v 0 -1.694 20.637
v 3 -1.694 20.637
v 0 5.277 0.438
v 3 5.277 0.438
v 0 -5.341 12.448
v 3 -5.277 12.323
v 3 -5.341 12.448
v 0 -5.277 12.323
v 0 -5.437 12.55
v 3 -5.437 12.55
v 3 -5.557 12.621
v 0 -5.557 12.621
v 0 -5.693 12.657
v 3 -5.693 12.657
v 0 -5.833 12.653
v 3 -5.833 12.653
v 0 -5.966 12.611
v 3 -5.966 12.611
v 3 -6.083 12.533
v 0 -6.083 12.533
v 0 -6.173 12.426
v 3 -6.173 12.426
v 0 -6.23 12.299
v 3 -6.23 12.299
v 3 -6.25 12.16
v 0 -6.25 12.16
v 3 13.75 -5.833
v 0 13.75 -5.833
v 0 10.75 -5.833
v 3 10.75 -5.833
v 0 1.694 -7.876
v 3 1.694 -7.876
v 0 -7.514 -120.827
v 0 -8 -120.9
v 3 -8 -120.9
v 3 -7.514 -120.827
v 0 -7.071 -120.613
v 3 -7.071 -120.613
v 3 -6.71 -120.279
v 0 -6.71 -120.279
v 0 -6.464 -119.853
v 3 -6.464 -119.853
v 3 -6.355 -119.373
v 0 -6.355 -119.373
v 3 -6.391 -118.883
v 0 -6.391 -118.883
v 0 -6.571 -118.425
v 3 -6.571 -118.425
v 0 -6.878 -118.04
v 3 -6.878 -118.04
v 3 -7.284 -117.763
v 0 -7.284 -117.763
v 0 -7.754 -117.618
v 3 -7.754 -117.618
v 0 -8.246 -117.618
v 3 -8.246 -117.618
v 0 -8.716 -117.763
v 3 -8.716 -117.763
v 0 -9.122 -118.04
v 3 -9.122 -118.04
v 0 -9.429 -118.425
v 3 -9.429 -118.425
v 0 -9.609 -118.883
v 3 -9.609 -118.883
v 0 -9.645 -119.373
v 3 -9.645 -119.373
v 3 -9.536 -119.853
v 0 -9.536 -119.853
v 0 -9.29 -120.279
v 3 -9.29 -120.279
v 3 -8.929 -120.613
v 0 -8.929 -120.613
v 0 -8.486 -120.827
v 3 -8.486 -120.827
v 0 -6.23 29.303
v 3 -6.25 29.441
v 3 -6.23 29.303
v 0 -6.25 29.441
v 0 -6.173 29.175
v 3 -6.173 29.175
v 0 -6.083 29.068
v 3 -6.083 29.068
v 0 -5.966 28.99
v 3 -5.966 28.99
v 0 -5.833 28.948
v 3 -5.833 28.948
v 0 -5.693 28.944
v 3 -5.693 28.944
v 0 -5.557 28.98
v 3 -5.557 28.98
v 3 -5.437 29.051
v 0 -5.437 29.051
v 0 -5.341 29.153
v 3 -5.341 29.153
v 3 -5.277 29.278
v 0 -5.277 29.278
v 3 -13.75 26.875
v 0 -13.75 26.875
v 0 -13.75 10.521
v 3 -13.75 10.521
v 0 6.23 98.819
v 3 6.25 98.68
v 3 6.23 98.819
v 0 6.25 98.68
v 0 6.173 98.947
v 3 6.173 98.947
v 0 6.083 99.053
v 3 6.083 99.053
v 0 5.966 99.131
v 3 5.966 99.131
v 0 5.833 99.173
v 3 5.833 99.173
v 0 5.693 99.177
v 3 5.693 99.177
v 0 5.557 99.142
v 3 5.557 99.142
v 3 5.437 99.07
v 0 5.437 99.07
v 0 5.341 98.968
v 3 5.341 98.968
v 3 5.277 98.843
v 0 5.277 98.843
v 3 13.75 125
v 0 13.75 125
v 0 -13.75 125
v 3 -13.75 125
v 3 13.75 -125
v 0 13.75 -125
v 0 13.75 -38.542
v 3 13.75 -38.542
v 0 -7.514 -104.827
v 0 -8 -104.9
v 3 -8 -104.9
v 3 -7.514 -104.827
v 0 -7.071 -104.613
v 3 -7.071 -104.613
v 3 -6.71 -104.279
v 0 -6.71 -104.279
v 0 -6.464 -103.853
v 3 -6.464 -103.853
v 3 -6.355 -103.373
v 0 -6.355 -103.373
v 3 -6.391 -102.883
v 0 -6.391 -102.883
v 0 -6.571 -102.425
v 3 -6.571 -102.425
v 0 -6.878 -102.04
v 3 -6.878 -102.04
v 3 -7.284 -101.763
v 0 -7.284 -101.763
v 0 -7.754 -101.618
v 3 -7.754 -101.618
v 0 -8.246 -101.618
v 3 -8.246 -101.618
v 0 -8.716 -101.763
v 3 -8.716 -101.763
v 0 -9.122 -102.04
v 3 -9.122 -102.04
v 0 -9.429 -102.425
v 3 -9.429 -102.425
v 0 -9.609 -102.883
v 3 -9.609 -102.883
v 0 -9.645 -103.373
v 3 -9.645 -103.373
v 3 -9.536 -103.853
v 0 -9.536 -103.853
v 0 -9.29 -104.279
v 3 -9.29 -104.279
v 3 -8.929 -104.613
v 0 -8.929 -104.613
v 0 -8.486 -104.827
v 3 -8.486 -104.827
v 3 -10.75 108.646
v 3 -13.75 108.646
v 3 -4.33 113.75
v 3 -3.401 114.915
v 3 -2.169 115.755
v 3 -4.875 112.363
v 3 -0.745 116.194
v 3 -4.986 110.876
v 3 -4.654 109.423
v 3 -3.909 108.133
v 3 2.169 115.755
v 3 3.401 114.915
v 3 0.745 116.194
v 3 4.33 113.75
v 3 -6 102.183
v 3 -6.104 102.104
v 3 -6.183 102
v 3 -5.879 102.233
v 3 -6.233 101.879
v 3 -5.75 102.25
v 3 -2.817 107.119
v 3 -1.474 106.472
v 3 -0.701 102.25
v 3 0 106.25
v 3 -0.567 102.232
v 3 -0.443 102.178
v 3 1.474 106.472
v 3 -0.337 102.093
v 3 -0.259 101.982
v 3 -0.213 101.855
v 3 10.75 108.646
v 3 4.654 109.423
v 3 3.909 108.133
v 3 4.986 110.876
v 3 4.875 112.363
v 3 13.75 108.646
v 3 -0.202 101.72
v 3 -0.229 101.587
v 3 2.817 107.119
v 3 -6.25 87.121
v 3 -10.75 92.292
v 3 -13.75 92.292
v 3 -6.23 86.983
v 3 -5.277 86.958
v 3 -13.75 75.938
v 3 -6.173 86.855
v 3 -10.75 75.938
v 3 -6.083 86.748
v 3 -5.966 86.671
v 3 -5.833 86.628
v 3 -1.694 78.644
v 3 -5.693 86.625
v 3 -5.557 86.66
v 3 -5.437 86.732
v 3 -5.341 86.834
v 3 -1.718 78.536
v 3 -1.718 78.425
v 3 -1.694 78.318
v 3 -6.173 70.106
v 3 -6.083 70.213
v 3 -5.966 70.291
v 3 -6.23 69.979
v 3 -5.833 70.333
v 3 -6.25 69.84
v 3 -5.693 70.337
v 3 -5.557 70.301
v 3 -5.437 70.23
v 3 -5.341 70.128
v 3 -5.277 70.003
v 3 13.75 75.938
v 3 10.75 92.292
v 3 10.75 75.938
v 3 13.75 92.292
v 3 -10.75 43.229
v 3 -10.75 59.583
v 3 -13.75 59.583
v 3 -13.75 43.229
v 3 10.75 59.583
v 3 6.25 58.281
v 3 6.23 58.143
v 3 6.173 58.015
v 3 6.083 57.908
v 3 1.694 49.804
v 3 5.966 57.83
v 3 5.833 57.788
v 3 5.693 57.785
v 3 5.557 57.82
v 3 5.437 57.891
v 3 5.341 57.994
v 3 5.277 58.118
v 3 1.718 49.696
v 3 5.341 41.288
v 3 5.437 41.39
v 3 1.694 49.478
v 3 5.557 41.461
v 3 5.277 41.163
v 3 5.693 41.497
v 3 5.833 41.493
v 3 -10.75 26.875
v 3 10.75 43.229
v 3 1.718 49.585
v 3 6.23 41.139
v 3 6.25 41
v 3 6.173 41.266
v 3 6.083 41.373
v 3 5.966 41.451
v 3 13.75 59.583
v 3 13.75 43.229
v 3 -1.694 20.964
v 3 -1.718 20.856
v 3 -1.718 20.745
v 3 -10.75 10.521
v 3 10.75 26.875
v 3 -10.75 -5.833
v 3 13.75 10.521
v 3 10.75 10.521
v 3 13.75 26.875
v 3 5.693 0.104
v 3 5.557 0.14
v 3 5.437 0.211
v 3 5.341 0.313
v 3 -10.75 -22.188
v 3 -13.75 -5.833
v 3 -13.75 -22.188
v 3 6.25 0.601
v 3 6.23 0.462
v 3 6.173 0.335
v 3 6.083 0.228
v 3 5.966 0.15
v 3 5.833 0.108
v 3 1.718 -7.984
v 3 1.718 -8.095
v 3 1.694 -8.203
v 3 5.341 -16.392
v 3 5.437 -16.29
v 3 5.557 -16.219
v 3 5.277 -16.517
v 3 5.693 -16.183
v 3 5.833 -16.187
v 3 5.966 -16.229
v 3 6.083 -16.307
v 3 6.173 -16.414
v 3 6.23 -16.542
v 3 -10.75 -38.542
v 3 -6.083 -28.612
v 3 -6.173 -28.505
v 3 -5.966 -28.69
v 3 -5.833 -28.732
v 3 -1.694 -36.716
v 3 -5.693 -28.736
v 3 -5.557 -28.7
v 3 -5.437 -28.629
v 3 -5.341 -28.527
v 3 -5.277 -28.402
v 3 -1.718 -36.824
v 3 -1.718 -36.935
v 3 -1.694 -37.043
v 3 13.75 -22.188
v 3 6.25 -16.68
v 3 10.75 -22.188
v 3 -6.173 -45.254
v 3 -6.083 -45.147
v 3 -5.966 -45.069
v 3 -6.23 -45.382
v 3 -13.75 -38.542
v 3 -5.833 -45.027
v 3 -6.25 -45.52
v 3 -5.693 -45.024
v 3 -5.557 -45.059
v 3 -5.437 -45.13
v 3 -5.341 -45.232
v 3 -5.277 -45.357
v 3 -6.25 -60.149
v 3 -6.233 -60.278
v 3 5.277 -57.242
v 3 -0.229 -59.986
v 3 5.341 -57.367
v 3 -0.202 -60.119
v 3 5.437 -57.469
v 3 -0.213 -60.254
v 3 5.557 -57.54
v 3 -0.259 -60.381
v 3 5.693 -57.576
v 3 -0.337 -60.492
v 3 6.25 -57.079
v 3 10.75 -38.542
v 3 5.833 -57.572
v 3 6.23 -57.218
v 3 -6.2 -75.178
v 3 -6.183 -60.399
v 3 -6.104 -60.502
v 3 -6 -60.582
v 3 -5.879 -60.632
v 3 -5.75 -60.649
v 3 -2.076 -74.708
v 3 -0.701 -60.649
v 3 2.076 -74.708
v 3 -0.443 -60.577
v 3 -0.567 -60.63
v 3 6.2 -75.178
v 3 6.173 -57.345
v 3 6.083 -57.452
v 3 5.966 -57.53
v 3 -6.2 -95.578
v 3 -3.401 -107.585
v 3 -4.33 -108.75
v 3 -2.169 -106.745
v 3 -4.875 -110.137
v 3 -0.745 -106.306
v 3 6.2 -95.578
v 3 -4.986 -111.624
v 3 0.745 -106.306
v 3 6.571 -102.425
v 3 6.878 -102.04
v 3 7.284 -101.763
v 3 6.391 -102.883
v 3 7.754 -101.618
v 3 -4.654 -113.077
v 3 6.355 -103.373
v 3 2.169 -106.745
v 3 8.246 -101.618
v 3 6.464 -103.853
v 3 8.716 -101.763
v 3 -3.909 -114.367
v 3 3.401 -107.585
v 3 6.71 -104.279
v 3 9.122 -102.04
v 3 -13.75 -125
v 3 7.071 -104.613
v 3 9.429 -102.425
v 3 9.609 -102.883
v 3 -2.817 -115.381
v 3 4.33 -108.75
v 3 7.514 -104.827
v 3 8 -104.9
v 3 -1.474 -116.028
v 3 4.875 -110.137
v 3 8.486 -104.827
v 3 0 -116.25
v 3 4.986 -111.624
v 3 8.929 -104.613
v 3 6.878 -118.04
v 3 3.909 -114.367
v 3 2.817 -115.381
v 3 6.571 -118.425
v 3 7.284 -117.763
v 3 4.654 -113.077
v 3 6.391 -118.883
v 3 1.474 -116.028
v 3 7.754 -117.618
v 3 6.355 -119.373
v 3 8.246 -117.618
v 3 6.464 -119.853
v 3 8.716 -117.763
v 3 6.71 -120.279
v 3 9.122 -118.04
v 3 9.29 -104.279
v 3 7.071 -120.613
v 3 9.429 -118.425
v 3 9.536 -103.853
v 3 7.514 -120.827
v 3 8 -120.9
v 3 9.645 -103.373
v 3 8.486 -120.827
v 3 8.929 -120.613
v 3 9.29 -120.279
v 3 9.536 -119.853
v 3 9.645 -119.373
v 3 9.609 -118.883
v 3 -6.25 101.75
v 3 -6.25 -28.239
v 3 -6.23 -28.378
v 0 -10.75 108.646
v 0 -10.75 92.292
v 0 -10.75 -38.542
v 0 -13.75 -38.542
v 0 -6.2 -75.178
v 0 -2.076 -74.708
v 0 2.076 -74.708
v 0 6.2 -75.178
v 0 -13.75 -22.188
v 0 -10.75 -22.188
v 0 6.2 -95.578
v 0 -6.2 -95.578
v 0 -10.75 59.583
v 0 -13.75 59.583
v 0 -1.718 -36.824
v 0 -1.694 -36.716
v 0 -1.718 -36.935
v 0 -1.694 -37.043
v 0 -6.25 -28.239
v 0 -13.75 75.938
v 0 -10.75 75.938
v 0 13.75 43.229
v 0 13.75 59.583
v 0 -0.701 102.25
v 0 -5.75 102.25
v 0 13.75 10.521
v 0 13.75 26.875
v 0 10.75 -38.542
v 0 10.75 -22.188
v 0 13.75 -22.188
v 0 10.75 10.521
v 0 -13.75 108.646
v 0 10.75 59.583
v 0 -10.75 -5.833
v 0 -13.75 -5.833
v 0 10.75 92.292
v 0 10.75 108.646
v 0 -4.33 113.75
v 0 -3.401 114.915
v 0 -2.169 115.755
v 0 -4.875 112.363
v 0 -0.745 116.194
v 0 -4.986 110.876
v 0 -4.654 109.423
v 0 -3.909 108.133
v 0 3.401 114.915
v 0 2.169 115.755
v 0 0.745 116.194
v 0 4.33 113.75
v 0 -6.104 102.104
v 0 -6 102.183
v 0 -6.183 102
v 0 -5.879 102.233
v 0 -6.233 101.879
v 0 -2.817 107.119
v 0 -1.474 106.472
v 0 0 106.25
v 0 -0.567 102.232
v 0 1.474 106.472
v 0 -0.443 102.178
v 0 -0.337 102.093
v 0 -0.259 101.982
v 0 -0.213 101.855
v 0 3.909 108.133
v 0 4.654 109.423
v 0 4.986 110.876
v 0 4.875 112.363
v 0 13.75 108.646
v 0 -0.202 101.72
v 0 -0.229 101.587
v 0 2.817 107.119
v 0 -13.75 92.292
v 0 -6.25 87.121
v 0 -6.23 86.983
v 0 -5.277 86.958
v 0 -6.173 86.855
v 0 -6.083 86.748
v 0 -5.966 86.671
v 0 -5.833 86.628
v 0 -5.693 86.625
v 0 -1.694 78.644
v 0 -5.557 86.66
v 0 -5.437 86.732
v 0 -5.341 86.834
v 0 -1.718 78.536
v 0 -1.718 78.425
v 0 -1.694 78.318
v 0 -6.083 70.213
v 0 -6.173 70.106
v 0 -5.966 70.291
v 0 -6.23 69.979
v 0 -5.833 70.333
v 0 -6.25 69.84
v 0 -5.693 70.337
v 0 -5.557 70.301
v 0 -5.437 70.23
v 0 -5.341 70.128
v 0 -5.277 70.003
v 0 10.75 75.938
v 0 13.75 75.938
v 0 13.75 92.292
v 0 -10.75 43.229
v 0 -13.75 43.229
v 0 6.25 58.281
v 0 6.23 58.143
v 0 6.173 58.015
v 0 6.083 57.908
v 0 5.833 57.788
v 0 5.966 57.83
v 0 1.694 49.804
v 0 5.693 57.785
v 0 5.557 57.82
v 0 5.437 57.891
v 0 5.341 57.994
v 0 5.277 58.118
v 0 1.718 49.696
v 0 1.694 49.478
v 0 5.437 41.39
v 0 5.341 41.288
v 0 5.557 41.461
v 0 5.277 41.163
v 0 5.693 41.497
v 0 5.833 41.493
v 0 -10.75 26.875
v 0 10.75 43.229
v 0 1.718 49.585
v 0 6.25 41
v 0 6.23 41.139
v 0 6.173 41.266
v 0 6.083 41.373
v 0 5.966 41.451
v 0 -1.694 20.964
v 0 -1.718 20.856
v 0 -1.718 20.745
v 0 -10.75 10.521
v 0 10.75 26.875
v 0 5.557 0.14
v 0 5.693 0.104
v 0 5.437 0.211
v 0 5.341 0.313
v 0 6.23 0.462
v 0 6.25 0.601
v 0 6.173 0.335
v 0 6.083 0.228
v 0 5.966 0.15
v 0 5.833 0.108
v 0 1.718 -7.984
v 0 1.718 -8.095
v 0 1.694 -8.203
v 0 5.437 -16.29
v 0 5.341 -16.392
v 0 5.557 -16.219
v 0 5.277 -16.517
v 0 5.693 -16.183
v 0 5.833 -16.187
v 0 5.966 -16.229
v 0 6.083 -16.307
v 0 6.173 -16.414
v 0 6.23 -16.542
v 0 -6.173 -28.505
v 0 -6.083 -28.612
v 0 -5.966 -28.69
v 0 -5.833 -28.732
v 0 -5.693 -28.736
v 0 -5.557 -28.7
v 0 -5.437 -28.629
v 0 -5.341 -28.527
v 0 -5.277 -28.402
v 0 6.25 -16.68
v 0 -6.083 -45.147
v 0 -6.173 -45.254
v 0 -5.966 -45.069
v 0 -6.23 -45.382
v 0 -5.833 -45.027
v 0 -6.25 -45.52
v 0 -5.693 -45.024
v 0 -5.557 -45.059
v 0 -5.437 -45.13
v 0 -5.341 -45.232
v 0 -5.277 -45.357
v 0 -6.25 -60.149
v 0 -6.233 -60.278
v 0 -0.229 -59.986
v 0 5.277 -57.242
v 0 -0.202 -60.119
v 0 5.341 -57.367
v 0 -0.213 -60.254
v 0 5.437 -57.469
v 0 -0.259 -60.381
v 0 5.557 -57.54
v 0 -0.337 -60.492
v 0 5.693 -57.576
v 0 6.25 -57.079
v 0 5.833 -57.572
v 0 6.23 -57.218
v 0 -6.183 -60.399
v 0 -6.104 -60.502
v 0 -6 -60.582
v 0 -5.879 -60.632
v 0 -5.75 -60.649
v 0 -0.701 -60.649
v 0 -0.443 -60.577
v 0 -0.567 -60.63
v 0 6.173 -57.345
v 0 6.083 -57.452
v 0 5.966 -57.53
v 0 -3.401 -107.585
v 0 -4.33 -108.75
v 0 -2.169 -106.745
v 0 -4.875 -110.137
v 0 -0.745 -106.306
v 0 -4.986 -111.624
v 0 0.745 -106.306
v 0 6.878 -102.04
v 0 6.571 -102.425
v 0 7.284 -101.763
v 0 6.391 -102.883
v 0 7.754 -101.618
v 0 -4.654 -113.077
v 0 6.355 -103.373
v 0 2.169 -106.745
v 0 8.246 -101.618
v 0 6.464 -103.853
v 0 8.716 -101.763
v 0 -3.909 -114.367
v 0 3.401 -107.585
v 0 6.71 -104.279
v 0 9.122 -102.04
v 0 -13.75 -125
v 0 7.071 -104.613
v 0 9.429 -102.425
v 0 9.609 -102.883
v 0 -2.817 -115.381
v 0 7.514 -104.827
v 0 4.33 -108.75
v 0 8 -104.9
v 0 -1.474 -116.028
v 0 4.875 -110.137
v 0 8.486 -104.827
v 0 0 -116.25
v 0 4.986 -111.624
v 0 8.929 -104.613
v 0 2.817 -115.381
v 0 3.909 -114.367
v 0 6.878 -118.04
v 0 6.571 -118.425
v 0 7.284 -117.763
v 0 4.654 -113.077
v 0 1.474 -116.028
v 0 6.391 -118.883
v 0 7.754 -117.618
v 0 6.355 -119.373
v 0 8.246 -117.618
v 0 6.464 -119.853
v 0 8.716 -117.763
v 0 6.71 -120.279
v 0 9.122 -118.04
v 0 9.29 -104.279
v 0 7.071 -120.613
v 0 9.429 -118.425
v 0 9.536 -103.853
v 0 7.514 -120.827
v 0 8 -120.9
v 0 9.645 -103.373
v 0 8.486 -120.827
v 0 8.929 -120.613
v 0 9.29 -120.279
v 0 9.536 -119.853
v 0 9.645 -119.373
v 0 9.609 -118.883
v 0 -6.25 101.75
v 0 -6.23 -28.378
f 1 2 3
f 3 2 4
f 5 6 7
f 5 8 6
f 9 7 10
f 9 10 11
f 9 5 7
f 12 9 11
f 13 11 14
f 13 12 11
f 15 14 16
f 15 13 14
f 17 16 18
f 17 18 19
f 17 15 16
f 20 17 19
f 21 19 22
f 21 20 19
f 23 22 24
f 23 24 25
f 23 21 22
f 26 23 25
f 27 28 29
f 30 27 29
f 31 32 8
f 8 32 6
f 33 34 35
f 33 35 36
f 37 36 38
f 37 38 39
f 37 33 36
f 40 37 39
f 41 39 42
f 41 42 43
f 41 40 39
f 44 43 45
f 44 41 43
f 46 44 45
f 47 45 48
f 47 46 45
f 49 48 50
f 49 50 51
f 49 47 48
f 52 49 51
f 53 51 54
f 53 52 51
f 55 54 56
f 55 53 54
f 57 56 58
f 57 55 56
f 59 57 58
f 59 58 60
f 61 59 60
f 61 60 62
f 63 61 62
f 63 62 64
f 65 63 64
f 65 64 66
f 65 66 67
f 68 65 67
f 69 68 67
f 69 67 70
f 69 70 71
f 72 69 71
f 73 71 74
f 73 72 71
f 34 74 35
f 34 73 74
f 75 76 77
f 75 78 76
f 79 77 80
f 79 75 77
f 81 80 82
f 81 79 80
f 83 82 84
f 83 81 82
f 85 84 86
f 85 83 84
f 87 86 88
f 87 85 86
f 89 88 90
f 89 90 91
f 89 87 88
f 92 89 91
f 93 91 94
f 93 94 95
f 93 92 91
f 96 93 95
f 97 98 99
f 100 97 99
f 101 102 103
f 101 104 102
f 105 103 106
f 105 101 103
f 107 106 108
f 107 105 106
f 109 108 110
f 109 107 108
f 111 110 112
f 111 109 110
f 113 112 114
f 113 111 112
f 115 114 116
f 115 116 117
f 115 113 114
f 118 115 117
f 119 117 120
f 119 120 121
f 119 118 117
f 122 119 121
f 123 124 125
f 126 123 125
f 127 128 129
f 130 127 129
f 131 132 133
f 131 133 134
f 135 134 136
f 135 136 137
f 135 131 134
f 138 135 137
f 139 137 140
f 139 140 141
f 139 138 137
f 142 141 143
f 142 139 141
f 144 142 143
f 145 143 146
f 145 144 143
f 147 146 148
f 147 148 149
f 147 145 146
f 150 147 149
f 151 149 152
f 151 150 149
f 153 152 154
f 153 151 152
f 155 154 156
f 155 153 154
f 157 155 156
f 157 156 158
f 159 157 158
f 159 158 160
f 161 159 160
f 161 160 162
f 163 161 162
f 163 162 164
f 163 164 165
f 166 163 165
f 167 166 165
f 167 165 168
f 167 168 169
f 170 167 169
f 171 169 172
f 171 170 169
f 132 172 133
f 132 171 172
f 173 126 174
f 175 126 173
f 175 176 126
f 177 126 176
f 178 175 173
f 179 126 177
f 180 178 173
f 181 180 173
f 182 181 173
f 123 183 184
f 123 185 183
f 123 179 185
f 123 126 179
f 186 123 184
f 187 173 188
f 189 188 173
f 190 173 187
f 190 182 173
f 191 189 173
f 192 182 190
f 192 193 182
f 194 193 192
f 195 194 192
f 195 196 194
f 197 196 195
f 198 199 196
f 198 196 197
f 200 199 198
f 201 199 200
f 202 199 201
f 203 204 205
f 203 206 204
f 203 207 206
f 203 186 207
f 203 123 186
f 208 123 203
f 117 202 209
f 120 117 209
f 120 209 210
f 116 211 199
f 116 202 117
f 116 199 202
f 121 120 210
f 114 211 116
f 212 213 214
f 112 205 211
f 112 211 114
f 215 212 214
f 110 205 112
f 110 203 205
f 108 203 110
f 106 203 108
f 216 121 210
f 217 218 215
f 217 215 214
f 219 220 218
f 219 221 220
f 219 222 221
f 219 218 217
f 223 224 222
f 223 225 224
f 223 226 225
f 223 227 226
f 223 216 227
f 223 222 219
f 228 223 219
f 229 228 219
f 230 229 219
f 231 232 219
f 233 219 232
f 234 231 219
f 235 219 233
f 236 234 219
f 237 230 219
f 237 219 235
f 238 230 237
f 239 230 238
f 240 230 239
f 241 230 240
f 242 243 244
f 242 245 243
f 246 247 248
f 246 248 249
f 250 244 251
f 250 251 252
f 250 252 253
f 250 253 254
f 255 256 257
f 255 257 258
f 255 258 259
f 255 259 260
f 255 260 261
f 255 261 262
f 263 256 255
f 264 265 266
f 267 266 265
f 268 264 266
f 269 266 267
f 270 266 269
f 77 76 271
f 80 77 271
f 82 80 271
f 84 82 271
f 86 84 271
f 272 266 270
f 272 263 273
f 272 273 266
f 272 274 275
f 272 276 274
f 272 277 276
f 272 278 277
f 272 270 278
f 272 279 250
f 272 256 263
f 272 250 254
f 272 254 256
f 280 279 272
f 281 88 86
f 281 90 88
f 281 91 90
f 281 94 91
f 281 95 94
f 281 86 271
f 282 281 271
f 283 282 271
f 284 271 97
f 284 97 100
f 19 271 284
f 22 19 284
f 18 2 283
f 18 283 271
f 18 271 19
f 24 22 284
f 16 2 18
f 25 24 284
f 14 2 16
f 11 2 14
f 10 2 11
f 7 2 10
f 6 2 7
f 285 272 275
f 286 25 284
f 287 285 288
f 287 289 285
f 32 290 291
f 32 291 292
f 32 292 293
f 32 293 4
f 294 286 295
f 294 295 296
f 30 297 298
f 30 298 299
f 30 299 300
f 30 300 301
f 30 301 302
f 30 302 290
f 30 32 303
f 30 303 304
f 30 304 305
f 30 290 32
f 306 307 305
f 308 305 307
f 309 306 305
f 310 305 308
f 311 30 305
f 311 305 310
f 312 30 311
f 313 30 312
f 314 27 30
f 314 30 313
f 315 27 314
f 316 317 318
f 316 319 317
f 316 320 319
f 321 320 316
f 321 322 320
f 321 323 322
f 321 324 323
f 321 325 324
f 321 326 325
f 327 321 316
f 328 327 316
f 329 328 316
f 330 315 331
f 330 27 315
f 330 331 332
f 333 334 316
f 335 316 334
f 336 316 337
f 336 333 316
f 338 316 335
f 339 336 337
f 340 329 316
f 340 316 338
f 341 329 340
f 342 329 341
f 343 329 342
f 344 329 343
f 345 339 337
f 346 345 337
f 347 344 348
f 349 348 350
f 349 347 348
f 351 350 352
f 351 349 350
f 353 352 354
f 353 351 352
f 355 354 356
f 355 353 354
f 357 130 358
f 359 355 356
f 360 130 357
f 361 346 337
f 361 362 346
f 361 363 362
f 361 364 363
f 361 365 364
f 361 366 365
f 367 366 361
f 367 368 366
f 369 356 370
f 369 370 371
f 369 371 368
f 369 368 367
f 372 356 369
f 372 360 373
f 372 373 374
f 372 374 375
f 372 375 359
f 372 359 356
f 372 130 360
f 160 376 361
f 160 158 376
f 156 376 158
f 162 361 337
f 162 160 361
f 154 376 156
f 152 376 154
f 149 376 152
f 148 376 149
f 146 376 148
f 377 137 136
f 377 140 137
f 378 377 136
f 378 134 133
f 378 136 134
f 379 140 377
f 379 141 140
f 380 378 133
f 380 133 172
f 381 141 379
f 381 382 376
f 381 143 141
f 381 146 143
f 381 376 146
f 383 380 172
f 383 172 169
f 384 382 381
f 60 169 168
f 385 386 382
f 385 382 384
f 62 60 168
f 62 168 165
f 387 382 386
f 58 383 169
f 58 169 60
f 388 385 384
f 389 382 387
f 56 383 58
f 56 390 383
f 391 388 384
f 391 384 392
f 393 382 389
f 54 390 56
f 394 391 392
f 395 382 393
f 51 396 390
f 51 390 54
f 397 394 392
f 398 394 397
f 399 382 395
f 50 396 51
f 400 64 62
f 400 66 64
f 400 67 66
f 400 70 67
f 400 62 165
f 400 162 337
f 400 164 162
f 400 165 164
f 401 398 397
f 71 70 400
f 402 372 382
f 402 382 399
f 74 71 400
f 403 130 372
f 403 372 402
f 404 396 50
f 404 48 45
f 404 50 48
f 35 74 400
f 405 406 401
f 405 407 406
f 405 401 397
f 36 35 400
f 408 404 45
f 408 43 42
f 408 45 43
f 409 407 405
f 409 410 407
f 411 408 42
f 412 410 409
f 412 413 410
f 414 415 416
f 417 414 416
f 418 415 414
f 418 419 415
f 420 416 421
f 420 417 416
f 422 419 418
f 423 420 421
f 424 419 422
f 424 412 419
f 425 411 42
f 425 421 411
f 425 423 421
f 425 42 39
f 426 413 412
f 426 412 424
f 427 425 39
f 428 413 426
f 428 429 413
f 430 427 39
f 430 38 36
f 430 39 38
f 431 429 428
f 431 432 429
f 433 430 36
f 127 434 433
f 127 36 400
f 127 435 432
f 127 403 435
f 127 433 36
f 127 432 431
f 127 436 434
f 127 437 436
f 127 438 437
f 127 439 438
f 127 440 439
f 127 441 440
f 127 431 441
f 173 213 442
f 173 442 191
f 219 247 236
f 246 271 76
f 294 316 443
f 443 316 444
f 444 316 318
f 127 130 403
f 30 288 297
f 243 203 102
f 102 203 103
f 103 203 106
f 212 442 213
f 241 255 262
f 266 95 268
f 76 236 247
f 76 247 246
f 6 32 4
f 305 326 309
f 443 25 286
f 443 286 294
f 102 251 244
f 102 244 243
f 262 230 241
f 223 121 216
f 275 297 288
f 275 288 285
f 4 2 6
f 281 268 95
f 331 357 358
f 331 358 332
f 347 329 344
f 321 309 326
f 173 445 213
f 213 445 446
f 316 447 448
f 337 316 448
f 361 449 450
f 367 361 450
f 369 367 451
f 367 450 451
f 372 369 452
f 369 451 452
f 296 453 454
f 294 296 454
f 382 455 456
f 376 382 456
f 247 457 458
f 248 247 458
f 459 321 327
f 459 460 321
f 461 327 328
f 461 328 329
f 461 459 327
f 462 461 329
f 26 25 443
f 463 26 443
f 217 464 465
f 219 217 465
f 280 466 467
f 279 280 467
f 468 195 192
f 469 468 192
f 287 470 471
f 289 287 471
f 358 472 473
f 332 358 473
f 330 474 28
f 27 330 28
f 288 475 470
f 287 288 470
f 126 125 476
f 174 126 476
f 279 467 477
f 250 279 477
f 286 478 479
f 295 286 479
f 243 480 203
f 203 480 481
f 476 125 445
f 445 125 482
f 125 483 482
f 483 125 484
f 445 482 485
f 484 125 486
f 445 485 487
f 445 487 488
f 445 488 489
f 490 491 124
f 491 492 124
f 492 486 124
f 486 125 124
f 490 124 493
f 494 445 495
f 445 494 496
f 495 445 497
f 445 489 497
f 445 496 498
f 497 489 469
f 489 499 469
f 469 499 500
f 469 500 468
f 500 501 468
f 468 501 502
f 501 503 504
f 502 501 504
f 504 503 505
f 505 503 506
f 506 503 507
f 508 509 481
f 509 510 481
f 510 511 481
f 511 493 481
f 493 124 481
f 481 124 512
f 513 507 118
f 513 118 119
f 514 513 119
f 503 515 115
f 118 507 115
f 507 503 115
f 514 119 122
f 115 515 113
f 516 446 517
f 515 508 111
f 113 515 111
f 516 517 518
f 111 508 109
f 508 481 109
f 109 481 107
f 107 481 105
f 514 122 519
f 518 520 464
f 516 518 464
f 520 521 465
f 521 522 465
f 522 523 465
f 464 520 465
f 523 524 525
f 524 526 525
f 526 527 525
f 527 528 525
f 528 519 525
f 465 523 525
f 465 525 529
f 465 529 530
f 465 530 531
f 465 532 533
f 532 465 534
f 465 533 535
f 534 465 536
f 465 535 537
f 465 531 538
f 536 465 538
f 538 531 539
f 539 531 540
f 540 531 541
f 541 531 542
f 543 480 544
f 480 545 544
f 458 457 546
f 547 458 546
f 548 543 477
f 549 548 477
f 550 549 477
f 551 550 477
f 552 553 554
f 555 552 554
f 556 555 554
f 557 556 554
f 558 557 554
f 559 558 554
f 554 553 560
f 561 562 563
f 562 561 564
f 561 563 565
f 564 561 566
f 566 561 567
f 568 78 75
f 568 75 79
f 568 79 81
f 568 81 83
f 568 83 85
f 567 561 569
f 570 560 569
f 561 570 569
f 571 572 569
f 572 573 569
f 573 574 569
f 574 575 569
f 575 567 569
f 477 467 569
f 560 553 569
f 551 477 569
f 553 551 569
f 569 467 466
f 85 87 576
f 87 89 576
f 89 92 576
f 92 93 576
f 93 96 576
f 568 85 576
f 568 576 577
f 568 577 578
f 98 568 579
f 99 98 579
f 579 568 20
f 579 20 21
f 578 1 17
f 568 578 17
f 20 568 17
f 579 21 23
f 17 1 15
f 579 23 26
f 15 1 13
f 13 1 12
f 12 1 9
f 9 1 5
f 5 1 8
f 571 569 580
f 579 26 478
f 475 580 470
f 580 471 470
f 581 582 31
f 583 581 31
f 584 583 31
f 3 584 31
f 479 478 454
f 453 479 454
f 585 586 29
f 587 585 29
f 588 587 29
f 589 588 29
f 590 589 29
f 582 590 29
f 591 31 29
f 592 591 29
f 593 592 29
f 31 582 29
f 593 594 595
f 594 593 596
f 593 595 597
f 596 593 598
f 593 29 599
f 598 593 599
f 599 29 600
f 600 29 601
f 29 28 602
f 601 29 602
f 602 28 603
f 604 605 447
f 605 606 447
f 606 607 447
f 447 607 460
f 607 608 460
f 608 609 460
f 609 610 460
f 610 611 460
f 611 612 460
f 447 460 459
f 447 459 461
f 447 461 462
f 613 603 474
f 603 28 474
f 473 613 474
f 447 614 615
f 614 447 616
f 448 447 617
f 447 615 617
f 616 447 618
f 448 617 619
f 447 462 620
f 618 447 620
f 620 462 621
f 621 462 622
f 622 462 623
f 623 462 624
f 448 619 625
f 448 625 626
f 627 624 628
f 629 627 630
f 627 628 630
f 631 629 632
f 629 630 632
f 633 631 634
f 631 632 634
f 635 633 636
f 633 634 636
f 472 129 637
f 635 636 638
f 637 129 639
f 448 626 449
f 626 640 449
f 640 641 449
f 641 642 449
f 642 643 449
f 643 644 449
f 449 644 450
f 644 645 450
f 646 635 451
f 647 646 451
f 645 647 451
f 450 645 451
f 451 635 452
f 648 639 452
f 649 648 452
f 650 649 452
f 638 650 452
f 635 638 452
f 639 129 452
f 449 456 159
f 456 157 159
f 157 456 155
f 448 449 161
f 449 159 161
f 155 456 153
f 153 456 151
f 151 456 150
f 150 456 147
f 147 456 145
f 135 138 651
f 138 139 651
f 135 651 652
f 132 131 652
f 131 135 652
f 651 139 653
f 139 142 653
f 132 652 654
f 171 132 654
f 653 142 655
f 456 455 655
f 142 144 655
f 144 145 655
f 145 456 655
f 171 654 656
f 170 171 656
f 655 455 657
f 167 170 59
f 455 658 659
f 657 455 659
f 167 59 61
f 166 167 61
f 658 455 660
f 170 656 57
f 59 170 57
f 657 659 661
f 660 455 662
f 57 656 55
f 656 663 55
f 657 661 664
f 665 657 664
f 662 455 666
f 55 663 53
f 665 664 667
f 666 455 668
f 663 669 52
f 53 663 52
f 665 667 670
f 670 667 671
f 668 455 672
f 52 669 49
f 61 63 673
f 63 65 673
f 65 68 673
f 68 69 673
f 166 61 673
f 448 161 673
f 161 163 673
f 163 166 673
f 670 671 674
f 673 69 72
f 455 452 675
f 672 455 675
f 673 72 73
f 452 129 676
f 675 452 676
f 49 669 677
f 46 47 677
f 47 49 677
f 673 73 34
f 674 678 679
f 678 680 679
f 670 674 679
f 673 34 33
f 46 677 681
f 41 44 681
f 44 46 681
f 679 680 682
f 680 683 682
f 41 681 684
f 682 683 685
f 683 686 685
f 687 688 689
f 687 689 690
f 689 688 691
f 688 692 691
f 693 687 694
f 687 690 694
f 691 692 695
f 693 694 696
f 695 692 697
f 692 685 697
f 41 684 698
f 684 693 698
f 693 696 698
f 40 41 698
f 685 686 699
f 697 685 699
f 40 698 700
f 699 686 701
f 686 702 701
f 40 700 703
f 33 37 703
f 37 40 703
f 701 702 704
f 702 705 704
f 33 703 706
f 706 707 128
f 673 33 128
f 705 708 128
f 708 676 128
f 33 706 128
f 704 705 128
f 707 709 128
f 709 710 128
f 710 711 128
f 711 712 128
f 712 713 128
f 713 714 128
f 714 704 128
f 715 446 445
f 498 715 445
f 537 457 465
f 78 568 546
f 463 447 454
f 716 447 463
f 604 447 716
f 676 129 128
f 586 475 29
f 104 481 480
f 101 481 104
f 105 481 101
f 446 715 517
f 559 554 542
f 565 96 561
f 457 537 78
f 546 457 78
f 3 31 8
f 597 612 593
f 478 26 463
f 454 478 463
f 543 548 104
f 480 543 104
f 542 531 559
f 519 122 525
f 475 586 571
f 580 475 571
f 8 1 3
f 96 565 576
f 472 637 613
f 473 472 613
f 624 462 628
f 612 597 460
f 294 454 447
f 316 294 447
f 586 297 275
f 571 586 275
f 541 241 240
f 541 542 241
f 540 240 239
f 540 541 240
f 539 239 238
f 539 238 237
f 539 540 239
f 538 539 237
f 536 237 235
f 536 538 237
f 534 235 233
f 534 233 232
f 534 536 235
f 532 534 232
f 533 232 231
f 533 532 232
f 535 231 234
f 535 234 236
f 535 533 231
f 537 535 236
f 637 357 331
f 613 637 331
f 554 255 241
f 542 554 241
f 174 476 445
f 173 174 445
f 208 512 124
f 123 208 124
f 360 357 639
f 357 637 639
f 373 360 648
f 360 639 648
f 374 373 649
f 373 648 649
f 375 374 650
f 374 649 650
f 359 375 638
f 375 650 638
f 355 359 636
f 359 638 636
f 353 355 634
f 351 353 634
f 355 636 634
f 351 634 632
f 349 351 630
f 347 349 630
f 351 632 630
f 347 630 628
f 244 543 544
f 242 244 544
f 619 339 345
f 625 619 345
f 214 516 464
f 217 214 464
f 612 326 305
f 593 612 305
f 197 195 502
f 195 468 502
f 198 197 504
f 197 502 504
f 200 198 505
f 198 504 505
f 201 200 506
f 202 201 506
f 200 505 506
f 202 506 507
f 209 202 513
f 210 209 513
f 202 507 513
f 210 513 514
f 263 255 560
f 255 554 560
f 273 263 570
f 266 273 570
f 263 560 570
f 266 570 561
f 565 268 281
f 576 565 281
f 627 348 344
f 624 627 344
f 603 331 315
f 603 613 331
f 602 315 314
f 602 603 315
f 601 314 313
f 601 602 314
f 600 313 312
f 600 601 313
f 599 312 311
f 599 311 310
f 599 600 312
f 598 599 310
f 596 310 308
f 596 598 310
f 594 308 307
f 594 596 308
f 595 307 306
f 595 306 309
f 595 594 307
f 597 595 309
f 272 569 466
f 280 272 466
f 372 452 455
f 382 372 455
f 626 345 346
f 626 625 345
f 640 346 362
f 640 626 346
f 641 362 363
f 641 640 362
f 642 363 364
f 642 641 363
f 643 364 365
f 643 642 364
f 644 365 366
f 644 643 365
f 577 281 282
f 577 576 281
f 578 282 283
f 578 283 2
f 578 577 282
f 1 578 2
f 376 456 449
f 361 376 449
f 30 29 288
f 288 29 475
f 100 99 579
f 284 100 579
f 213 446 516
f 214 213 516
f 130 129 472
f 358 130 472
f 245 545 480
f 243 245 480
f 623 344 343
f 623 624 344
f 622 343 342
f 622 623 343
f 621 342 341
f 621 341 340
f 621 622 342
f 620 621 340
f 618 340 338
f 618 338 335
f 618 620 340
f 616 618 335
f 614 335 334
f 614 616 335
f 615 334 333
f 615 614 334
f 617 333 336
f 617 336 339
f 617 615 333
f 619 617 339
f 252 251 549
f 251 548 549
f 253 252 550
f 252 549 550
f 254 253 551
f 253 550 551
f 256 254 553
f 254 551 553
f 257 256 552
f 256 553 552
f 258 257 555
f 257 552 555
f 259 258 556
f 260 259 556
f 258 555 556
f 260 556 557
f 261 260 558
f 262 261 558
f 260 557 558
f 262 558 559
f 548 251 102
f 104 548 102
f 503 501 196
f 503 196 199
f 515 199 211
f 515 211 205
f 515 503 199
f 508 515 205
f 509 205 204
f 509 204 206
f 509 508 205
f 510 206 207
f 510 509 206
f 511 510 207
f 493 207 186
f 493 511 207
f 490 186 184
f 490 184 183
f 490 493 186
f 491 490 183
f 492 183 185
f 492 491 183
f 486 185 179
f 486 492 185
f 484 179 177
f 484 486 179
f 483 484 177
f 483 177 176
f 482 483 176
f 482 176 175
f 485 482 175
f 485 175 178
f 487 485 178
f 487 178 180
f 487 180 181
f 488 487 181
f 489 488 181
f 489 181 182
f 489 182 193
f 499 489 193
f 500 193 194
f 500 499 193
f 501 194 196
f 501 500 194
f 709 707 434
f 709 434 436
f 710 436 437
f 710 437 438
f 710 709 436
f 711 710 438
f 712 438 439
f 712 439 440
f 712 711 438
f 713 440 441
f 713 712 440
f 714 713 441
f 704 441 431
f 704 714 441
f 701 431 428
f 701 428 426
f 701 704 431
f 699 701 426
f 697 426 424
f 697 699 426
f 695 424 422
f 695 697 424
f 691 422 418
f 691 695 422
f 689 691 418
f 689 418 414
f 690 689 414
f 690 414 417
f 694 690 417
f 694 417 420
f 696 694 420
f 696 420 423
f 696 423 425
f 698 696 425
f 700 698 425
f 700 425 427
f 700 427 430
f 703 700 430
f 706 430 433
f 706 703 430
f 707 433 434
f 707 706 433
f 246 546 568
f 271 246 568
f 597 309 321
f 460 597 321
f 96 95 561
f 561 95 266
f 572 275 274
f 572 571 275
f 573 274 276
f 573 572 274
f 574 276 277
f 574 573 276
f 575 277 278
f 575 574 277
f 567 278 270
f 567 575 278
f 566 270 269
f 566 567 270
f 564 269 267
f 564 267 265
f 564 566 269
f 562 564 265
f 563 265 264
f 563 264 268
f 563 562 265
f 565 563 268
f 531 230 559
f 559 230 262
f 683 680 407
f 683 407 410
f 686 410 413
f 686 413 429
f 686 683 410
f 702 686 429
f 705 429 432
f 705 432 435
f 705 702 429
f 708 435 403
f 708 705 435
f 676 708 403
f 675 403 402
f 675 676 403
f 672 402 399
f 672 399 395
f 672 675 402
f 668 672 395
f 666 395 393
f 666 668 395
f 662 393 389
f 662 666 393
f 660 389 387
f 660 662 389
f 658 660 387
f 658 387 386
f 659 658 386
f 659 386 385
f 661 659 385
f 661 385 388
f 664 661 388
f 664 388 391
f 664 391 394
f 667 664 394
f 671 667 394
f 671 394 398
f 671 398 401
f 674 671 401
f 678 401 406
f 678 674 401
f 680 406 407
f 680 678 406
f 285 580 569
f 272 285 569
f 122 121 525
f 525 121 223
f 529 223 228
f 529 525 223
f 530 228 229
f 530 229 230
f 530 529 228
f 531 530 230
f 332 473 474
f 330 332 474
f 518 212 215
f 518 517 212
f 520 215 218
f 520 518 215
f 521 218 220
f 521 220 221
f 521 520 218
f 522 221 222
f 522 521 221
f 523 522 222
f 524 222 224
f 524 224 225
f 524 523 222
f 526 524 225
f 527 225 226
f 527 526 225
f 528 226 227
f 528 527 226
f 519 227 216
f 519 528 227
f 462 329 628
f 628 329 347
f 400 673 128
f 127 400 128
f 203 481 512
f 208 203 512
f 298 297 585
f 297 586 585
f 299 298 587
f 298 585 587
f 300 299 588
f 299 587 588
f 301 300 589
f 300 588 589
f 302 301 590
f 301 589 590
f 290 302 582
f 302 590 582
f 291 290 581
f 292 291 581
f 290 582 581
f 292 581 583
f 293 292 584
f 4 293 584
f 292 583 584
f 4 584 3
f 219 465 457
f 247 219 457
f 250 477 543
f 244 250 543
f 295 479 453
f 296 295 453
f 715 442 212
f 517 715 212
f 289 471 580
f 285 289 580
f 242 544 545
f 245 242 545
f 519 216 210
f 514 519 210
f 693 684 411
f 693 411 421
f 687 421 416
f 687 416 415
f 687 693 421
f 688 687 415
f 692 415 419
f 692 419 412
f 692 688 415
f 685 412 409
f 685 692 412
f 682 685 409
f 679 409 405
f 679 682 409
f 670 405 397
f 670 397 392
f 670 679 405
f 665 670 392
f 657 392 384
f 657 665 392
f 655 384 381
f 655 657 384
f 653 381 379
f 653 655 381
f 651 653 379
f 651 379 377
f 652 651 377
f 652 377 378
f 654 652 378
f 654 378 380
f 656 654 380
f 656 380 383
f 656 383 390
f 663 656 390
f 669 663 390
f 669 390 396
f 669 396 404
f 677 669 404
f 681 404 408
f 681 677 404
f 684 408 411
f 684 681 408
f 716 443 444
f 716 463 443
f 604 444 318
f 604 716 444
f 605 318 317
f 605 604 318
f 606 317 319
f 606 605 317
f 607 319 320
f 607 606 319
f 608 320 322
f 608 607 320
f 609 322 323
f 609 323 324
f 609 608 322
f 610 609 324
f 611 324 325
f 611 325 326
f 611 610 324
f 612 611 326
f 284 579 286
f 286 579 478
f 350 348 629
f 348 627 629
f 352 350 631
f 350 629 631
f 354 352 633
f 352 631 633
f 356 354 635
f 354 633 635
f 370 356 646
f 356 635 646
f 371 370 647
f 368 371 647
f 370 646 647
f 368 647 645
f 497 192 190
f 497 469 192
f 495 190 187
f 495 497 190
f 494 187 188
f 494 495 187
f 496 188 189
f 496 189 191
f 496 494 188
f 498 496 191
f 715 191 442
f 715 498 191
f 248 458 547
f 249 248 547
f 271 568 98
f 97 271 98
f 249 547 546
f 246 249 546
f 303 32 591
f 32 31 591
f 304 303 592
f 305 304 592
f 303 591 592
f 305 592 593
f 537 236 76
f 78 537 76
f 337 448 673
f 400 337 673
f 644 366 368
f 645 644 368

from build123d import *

# Parameters (mm, degrees)
SKETCH1_R           = 1.65
SKETCH1_R_2         = 5
BOSS_EXTRUDE1_DEPTH = 3
CUT_EXTRUDE1_DEPTH  = 3
FILLET1_R           = 0.5


with BuildPart() as part:
    # Sketch1 → Boss-Extrude1 (new body)
    with BuildSketch(Plane(origin=(0, 0, 0), x_dir=(0, 0, -1), z_dir=(1, 0, 0))):
        Polygon((-125, 13.75), (-125, -13.75), (-108.645833333, -13.75), (-108.645833333, -10.75), (-92.291666667, -10.75), (-92.291666667, -13.75), (-75.9375, -13.75), (-75.9375, -10.75), (-59.583333333, -10.75), (-59.583333333, -13.75), (-43.229166667, -13.75), (-43.229166667, -10.75), (-26.875, -10.75), (-26.875, -13.75), (-10.520833333, -13.75), (-10.520833333, -10.75), (5.833333333, -10.75), (5.833333333, -13.75), (22.1875, -13.75), (22.1875, -10.75), (38.541666667, -10.75), (38.541666667, -13.75), (125, -13.75), (125, 13.75), (38.541666667, 13.75), (38.541666667, 10.75), (22.1875, 10.75), (22.1875, 13.75), (5.833333333, 13.75), (5.833333333, 10.75), (-10.520833333, 10.75), (-10.520833333, 13.75), (-26.875, 13.75), (-26.875, 10.75), (-43.229166667, 10.75), (-43.229166667, 13.75), (-59.583333333, 13.75), (-59.583333333, 10.75), (-75.9375, 10.75), (-75.9375, 13.75), (-92.291666667, 13.75), (-92.291666667, 10.75), (-108.645833333, 10.75), (-108.645833333, 13.75), align=None)
        with Locations((103.25, -8)):
            Circle(SKETCH1_R, mode=Mode.SUBTRACT)
        with Locations((119.25, -8)):
            Circle(SKETCH1_R, mode=Mode.SUBTRACT)
        with Locations((-111.25, 0)):
            Circle(SKETCH1_R_2, mode=Mode.SUBTRACT)
        with BuildLine():
            Line((95.5778, -6.2), (75.1778, -6.2))
            ThreePointArc((75.1778, -6.2), (74.648857766, 0), (75.1778, 6.2))
            Line((75.1778, 6.2), (95.5778, 6.2))
            Line((95.5778, 6.2), (95.5778, -6.2))
        make_face(mode=Mode.SUBTRACT)
        with Locations((111.25, 0)):
            Circle(SKETCH1_R_2, mode=Mode.SUBTRACT)
        with Locations((103.25, 8)):
            Circle(SKETCH1_R, mode=Mode.SUBTRACT)
        with Locations((119.25, 8)):
            Circle(SKETCH1_R, mode=Mode.SUBTRACT)
    extrude(amount=BOSS_EXTRUDE1_DEPTH)

    # Sketch3 → Cut-Extrude1 (cut)
    with BuildSketch(Plane(origin=(3, 0, 0), x_dir=(0, 0, -1), z_dir=(1, 0, 0))):
        Polygon((-102.25, 0), (-102.25, -6.25), (-84.139910217, -6.25), align=None)
        Polygon((-55.299825543, 6.25), (-101.661655387, 6.25), (-78.480740465, -1.75), align=None)
        Polygon((-49.640655791, 1.75), (-72.821570713, -6.25), (-26.459740869, -6.25), align=None)
        Polygon((2.380343805, 6.25), (-43.981486039, 6.25), (-20.800571117, -1.75), align=None)
        Polygon((8.039513557, 1.75), (-15.141401365, -6.25), (31.220428479, -6.25), align=None)
        Polygon((60.060513153, 6.25), (13.698683309, 6.25), (36.879598231, -1.75), align=None)
        Polygon((60.648857766, 0), (42.538767983, -6.25), (60.648857766, -6.25), align=None)
    extrude(amount=-CUT_EXTRUDE1_DEPTH, mode=Mode.SUBTRACT)

    # Fillet1
    fillet1_edges = [part.edges().sort_by_distance(p)[0] for p in [
        (1.5, -1.75, 20.800571117),
        (1.5, 6.25, 43.981486039),
        (1.5, 6.25, -2.380343805),
        (1.5, 1.75, -8.039513557),
        (1.5, -6.25, -31.220428479),
        (1.5, -6.25, 15.141401365),
        (1.5, -1.75, 78.480740465),
        (1.5, 6.25, 101.661655387),
        (1.5, 6.25, 55.299825543),
        (1.5, 1.75, 49.640655791),
        (1.5, -6.25, 26.459740869),
        (1.5, -6.25, 72.821570713),
        (1.5, -6.25, -42.538767983),
        (1.5, 0, -60.648857766),
        (1.5, -6.25, -60.648857766),
        (1.5, -1.75, -36.879598231),
        (1.5, 6.25, -13.698683309),
        (1.5, 6.25, -60.060513153),
        (1.5, 0, 102.25),
        (1.5, -6.25, 84.139910217),
        (1.5, -6.25, 102.25),
    ]]
    fillet(fillet1_edges, radius=FILLET1_R)


solid = part.part
